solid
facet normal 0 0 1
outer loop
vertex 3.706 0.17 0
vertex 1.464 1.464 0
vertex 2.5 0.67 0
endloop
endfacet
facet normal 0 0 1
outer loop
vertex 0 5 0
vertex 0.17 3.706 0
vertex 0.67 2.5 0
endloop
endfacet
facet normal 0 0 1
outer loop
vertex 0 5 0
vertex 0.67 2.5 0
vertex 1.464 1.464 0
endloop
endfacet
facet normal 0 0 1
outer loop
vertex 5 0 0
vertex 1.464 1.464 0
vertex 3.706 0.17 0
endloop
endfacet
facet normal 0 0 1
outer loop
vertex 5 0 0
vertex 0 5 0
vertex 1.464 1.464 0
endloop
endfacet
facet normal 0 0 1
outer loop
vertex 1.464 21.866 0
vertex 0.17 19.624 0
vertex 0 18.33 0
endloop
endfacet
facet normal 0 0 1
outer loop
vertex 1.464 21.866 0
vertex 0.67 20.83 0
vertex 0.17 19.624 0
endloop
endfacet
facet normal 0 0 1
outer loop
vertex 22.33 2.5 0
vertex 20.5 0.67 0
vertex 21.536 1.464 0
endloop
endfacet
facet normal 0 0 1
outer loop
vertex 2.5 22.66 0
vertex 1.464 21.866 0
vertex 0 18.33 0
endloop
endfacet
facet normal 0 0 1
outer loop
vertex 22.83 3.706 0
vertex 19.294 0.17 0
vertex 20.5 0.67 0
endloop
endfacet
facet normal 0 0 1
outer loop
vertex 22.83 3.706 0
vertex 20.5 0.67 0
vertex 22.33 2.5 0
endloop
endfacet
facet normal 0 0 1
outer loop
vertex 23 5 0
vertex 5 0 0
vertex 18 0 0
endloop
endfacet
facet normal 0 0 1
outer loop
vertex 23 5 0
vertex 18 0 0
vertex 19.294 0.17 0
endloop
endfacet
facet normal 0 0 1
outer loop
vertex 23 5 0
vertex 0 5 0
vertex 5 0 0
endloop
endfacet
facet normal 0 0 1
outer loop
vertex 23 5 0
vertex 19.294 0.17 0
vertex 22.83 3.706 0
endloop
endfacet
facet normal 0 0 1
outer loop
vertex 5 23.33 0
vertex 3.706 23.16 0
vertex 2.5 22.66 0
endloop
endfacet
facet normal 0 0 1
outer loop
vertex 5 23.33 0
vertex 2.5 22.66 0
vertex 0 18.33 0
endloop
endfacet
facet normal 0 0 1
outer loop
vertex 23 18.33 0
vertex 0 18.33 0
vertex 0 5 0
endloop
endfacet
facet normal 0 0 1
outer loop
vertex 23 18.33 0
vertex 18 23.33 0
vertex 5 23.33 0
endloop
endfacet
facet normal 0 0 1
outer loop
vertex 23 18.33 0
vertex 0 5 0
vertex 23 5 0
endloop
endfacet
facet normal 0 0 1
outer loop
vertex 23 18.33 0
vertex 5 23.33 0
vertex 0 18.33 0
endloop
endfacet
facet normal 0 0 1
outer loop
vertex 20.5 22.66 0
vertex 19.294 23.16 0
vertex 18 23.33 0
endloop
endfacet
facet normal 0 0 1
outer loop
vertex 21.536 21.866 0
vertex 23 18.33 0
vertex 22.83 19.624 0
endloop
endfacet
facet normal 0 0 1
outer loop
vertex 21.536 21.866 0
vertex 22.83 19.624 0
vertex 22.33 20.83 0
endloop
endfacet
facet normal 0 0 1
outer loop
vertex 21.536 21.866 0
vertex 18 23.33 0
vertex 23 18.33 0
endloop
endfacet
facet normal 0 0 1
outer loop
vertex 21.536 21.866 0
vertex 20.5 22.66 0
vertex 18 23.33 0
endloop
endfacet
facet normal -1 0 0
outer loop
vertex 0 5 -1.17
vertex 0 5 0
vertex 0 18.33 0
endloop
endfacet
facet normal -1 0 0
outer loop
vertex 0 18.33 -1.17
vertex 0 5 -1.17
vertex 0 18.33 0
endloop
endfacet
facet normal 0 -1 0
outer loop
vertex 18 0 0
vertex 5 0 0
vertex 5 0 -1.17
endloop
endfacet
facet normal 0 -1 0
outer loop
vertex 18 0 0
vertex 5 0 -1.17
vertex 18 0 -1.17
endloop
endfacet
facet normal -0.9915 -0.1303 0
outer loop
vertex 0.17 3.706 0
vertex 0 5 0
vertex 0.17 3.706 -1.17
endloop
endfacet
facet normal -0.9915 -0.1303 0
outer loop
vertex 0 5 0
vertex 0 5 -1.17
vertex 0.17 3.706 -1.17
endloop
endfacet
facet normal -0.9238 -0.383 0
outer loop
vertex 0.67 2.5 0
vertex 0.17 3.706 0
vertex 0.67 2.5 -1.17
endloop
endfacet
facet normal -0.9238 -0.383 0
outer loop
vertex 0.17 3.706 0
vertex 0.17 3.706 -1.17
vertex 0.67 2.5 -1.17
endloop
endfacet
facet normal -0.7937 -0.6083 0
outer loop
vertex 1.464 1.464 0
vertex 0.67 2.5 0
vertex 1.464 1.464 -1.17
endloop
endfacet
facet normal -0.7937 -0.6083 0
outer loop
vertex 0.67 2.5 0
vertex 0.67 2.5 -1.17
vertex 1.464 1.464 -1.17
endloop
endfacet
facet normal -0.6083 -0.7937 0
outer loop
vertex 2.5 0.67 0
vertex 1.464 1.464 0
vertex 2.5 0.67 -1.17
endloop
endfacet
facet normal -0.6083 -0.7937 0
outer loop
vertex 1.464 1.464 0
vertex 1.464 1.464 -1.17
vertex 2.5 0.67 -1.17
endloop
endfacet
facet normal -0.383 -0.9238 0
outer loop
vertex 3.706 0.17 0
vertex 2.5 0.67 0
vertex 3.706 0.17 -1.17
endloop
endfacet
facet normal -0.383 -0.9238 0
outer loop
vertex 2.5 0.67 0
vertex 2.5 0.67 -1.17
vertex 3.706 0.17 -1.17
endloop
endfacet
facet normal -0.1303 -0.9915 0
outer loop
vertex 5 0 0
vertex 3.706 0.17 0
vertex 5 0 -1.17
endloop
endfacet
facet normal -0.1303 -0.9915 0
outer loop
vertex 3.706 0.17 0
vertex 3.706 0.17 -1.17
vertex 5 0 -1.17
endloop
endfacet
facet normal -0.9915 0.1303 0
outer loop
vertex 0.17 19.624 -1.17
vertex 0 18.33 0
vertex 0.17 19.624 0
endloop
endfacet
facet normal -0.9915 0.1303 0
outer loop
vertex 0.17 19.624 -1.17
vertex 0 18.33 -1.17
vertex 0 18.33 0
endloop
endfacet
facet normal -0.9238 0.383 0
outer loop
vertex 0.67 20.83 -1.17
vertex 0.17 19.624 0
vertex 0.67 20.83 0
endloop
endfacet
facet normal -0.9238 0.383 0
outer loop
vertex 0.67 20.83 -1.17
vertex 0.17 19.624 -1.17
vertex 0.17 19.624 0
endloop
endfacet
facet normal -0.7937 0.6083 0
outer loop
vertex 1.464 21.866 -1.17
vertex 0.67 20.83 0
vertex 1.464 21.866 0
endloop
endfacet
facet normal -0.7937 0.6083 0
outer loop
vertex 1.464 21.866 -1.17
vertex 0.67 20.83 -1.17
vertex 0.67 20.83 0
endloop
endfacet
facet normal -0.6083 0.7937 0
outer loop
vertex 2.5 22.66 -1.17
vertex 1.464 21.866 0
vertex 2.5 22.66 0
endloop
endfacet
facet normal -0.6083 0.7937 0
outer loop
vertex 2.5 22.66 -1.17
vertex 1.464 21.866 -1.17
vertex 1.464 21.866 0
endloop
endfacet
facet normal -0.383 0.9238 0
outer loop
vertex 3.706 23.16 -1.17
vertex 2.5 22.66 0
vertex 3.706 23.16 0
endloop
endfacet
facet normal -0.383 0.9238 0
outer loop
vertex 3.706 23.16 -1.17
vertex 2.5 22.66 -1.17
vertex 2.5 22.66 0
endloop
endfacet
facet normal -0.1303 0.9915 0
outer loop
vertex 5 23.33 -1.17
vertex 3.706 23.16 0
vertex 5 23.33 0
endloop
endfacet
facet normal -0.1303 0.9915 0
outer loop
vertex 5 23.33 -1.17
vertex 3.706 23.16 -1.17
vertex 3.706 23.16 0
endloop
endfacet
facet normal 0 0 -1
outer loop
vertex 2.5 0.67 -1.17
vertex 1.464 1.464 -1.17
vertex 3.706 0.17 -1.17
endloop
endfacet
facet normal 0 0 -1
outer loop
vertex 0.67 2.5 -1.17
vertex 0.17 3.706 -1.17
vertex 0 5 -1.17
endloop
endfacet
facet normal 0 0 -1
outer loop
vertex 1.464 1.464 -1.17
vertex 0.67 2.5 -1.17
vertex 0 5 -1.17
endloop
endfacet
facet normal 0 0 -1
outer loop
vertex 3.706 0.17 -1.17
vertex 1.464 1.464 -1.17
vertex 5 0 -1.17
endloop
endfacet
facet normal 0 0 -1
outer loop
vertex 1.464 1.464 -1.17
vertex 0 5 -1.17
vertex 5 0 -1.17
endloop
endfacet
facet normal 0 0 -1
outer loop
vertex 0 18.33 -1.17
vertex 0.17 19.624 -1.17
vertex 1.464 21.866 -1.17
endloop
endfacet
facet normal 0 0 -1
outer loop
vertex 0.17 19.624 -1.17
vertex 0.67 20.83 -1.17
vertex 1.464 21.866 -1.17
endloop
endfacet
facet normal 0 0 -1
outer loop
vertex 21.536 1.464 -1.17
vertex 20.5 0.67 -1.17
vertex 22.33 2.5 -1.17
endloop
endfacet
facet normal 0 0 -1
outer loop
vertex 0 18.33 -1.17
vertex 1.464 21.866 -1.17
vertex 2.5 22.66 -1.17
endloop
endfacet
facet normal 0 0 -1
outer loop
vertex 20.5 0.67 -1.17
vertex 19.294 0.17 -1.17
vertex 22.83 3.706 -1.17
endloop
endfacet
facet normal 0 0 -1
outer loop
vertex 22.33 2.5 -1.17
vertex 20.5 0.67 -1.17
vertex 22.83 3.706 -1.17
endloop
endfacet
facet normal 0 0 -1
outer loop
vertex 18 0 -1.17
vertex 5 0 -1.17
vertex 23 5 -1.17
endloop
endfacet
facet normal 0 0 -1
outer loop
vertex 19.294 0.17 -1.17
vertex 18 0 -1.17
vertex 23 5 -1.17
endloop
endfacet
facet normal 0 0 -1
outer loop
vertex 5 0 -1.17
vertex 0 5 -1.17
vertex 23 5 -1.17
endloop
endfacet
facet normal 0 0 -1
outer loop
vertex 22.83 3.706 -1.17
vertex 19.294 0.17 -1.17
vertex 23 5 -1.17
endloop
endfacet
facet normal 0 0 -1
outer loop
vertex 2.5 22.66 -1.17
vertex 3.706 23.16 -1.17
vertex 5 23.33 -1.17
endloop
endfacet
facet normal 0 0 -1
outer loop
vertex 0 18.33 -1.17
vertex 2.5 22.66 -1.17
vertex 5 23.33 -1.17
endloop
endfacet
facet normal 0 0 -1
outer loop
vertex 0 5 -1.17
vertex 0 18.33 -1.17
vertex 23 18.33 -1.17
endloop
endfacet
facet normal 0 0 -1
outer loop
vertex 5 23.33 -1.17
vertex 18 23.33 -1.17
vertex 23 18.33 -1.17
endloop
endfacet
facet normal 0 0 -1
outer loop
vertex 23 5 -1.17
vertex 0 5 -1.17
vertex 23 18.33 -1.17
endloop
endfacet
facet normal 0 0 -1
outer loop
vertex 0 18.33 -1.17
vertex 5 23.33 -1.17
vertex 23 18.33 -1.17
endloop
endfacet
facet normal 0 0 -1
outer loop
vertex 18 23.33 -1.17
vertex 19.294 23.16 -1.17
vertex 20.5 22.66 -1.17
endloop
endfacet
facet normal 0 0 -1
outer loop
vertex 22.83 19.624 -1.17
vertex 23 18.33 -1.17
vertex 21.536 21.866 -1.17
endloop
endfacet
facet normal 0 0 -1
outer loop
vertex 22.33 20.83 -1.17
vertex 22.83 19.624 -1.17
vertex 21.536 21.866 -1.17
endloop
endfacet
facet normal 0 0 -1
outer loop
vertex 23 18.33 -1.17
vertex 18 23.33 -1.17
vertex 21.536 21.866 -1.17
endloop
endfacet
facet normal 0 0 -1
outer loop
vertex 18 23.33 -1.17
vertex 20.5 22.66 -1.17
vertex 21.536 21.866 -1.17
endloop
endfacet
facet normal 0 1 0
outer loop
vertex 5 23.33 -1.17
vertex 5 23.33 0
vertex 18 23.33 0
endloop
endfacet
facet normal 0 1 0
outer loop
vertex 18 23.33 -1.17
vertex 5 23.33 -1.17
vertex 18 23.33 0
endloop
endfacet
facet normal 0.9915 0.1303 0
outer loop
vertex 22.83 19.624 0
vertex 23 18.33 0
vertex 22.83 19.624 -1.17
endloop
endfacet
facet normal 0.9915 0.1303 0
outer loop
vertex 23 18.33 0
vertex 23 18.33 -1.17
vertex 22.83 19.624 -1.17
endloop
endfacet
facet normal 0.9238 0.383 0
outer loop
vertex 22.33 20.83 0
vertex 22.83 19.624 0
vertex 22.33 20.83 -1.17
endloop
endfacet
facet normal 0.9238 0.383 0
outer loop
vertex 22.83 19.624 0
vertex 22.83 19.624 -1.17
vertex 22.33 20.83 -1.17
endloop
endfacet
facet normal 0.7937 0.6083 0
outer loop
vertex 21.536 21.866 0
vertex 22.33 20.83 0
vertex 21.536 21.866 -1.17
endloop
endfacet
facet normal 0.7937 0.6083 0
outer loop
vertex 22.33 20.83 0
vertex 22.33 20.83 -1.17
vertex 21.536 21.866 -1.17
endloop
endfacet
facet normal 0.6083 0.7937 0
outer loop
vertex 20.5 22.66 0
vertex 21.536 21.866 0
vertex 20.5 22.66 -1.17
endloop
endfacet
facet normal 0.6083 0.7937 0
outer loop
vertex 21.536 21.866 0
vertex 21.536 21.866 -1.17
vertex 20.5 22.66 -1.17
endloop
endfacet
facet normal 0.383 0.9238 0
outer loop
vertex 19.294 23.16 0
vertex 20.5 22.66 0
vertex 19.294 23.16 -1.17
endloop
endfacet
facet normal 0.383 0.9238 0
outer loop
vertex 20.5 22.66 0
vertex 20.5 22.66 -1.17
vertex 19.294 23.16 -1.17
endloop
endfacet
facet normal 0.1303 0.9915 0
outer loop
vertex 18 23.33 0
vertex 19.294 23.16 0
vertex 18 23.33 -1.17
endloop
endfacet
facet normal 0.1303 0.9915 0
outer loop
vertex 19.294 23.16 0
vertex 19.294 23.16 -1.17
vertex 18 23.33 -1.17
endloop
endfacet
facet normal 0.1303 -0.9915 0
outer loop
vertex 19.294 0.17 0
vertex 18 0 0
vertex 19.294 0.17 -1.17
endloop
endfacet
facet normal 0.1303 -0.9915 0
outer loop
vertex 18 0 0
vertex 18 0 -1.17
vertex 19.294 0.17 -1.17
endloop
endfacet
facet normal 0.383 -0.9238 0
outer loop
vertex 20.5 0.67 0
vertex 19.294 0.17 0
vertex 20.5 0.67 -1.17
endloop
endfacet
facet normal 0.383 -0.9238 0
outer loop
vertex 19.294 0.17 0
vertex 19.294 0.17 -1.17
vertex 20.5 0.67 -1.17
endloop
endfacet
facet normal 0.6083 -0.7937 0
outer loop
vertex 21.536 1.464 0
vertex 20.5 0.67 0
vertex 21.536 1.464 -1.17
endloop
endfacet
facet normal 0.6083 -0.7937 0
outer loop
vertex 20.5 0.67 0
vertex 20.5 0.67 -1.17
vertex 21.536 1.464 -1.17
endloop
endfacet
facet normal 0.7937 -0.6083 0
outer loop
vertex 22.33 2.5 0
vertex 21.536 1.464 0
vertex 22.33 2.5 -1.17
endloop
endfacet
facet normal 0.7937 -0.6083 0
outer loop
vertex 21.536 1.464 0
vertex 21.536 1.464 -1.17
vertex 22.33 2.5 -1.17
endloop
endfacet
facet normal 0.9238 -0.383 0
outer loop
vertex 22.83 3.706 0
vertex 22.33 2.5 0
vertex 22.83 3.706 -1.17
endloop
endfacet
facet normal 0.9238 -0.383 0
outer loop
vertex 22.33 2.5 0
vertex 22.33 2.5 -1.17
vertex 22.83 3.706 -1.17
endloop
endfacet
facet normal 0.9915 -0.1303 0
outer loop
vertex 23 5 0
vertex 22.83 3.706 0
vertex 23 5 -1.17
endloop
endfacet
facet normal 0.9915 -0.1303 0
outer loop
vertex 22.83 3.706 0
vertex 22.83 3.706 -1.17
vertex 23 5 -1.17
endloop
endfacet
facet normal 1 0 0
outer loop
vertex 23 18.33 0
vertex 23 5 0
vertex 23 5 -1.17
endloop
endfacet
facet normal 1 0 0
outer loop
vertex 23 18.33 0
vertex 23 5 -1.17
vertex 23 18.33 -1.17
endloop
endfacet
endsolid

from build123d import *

# Parameters (mm, degrees)
SKETCH2_W          = 23
SKETCH2_H          = 23.33
BASE_FLANGE1_DEPTH = 1.17
FILLET1_R          = 5


# Sheet-metal steps are written as plain solids
with BuildPart() as part:
    # Sketch2 → Base-Flange1 (new body)
    with BuildSketch(Plane.XY):
        with Locations((11.5, 11.665)):
            Rectangle(SKETCH2_W, SKETCH2_H)
    extrude(amount=-BASE_FLANGE1_DEPTH)

    # Fillet1
    fillet1_edges = [part.edges().sort_by_distance(p)[0] for p in [
        (0, 23.33, -0.585),
        (23, 23.33, -0.585),
        (23, 0, -0.585),
        (0, 0, -0.585),
    ]]
    fillet(fillet1_edges, radius=FILLET1_R)


solid = part.part
